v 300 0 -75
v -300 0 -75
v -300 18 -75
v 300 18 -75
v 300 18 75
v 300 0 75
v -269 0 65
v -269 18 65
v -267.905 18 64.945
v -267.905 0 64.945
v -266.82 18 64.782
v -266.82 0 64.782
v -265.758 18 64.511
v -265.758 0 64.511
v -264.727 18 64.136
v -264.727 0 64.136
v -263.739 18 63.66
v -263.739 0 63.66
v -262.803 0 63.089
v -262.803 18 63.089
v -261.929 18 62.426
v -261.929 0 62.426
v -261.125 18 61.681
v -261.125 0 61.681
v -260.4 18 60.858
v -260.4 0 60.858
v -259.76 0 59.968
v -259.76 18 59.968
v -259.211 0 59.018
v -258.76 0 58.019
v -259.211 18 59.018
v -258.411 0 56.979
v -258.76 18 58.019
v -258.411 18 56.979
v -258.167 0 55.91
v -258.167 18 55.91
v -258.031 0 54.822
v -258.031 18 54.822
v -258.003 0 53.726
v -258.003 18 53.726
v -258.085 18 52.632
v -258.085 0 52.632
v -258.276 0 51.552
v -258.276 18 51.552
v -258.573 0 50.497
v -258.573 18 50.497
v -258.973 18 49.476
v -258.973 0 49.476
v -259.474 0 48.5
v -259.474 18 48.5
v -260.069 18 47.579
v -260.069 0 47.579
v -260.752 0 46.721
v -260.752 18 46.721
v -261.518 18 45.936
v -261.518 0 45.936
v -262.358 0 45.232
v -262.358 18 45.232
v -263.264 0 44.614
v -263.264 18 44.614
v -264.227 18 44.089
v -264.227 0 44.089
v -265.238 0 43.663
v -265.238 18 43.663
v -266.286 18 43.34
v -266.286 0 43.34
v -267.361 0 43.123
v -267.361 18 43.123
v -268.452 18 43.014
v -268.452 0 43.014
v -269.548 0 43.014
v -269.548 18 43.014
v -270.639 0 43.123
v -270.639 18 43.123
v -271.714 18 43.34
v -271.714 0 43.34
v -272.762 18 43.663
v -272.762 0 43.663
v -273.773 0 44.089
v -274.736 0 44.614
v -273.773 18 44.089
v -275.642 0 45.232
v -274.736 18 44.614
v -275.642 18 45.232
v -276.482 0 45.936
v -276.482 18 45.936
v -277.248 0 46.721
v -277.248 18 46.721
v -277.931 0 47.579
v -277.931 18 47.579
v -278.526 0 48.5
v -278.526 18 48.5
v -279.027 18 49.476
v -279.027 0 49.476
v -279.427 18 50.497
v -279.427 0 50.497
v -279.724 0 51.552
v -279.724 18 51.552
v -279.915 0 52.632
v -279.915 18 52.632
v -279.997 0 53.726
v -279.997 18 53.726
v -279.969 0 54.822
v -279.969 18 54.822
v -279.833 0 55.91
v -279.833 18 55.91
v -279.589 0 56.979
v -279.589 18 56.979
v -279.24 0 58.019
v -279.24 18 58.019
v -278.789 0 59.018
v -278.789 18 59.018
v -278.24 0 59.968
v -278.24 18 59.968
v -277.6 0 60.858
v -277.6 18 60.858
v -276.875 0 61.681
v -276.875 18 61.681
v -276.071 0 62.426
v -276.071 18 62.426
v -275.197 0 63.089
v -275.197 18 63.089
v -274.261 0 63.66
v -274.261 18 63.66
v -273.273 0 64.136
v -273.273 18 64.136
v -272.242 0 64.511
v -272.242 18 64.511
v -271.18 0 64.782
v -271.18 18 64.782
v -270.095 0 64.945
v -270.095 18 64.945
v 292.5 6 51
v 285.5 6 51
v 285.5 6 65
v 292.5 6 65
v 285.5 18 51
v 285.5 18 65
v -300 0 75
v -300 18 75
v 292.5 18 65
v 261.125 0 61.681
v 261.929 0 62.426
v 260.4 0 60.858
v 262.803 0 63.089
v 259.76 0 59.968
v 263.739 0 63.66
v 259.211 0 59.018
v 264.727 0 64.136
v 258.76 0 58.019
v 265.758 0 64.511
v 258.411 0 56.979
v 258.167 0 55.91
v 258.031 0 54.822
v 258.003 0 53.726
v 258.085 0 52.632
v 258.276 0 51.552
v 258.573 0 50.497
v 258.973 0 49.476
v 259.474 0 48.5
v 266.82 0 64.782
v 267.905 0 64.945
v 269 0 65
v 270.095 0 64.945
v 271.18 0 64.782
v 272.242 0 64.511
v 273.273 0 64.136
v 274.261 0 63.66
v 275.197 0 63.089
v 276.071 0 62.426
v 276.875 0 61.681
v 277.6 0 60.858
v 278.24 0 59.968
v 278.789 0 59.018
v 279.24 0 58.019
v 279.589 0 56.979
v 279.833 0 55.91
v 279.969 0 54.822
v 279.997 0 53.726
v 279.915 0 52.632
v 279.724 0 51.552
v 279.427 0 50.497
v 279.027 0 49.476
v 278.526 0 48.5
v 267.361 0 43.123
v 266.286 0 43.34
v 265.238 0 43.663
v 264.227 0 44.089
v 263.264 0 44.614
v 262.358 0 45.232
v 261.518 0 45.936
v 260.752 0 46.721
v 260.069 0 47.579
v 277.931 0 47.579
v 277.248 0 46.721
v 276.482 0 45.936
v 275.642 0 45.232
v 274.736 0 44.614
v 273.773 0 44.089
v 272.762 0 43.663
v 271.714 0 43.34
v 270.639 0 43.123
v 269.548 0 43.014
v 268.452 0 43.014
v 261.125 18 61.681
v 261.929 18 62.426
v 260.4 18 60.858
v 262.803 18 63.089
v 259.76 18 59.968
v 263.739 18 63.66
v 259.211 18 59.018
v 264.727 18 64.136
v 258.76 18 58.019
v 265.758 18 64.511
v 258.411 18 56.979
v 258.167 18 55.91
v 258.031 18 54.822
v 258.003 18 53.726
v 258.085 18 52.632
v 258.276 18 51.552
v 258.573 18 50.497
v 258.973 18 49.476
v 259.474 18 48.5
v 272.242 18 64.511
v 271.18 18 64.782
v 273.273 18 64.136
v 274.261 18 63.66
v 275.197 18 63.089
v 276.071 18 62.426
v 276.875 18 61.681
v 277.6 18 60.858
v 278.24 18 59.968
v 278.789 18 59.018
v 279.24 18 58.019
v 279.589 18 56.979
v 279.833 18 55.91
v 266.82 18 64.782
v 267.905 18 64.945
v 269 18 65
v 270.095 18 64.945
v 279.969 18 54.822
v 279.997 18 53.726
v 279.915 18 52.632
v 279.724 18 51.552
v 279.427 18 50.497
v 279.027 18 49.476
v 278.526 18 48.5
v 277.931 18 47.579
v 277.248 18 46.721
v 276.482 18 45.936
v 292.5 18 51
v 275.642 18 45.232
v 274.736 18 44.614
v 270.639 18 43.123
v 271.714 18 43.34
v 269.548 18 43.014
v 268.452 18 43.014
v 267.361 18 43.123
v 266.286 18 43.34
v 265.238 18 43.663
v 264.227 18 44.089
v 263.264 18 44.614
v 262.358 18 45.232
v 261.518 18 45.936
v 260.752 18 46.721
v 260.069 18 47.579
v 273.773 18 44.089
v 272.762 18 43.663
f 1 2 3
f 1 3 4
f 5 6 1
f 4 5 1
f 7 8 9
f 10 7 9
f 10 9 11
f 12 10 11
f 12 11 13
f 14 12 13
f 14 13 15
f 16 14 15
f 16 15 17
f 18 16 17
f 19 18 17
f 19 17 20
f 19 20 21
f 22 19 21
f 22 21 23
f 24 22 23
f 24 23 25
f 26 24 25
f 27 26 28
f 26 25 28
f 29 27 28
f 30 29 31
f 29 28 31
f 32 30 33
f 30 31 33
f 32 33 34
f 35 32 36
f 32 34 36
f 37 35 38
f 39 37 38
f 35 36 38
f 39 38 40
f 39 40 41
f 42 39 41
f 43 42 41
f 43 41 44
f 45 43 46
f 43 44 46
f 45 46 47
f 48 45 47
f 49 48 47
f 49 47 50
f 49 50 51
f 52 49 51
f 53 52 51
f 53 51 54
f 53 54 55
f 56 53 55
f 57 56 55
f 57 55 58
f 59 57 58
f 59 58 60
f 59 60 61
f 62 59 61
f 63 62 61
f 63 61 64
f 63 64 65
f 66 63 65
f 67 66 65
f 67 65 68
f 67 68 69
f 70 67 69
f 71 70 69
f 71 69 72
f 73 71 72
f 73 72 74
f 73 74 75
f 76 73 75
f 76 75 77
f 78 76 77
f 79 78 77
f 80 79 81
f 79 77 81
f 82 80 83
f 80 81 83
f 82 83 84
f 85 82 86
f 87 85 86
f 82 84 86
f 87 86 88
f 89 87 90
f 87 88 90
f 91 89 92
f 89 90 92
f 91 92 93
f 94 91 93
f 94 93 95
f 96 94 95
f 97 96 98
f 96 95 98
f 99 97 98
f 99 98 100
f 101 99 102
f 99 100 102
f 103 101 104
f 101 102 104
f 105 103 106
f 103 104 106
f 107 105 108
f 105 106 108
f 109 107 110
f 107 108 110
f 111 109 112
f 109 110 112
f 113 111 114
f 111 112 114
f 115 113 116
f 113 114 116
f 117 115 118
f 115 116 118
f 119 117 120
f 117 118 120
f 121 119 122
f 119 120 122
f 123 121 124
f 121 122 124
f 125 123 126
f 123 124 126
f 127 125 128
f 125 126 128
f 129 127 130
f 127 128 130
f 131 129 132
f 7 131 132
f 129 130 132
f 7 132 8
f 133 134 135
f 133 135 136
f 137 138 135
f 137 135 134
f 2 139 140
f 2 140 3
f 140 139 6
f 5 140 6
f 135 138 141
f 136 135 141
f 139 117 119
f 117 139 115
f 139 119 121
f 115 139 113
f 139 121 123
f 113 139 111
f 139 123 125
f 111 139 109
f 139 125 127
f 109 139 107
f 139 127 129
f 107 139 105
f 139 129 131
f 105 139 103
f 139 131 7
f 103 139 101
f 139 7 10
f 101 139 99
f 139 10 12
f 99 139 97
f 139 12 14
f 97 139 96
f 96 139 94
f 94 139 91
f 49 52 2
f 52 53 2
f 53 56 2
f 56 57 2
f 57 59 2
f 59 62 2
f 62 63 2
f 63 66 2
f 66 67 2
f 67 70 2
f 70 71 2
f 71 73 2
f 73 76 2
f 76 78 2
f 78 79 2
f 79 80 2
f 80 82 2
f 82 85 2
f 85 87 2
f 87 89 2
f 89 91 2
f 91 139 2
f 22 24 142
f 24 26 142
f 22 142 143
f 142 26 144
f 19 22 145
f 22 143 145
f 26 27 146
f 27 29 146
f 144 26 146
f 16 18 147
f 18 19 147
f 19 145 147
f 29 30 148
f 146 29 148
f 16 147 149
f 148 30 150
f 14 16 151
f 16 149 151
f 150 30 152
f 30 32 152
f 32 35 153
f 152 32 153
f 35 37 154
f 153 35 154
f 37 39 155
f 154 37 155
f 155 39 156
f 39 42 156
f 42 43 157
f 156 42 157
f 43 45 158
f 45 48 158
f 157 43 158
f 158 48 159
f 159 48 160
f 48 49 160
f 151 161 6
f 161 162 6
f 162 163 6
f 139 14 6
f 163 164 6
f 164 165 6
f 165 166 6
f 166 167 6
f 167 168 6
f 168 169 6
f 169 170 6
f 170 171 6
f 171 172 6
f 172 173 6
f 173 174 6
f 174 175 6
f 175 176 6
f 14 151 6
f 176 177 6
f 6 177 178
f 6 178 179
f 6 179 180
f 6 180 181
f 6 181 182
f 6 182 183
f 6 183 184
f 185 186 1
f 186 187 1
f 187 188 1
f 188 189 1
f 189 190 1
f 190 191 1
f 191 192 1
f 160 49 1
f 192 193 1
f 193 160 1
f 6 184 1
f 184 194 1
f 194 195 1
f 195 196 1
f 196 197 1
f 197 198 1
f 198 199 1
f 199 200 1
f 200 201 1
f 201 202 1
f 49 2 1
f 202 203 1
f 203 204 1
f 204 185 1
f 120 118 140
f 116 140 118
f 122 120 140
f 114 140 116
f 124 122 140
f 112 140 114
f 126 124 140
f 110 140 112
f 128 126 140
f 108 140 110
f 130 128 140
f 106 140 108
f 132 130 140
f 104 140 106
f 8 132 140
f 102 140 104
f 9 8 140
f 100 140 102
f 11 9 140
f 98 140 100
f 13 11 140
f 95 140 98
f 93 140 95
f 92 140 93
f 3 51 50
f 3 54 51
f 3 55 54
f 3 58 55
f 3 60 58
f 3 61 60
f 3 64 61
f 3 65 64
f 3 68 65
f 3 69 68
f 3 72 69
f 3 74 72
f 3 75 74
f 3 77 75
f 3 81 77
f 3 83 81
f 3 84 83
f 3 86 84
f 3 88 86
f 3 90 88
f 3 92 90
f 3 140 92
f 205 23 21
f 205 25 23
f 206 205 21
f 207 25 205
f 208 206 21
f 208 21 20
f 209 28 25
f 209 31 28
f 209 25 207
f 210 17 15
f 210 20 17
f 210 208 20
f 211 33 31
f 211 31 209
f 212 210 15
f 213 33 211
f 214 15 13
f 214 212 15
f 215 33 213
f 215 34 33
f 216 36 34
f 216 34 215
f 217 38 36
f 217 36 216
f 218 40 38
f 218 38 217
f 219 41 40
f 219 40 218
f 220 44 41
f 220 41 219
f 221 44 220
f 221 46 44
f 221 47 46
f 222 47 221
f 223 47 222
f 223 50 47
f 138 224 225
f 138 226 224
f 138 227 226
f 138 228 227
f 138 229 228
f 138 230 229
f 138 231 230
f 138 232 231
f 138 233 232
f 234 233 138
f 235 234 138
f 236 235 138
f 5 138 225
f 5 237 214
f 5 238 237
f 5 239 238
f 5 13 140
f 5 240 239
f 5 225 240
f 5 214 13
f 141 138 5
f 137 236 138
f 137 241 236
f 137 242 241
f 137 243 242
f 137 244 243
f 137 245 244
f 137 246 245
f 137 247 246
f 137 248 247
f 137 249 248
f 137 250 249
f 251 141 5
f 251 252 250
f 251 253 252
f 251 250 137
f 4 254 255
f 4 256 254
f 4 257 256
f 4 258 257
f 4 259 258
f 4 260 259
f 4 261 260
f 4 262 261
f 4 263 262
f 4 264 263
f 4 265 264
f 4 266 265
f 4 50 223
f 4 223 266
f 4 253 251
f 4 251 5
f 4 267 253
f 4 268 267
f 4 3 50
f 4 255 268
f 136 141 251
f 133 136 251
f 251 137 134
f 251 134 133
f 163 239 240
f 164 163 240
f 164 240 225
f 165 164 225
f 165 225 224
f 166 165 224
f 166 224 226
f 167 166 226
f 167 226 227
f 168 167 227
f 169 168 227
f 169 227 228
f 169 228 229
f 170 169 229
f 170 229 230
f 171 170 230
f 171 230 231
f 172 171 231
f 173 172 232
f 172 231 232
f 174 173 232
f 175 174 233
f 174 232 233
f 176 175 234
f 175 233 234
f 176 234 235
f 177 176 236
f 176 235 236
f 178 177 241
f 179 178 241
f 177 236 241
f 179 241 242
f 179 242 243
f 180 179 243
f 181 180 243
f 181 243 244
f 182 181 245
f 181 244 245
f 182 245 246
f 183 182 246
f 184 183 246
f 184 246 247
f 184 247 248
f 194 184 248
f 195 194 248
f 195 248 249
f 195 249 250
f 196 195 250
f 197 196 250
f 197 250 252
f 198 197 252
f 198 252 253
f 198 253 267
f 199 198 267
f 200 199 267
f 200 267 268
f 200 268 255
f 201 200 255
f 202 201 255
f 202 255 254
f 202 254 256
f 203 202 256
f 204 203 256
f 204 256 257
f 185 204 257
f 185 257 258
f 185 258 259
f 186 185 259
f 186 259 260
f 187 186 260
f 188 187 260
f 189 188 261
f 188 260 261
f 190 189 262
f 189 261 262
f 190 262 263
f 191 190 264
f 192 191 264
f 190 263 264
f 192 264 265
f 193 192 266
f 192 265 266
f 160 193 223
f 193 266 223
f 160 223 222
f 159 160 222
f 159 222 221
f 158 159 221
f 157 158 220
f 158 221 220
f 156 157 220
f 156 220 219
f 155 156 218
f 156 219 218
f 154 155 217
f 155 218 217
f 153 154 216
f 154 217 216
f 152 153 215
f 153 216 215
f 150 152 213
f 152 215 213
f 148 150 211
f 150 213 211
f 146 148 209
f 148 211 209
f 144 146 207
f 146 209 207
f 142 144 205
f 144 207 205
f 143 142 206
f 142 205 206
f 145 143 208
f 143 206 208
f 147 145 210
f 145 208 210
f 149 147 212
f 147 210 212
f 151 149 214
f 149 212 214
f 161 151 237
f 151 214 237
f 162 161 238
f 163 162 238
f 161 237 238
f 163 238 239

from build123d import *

# Parameters (mm, degrees)
ESQUISSE1_W             = 600
ESQUISSE1_H             = 150
BOSS_EXTRU_1_DEPTH      = 18
ESQUISSE3_R             = 11
ENL_V_MAT_EXTRU_1_DEPTH = 20
ESQUISSE4_W             = 7
ESQUISSE4_H             = 14
ENL_V_MAT_EXTRU_2_DEPTH = 12


with BuildPart() as part:
    # Esquisse1 → Boss.-Extru.1 (new body)
    with BuildSketch(Plane(origin=(0, 0, 0), x_dir=(1, 0, 0), z_dir=(0, 1, 0))):
        Rectangle(ESQUISSE1_W, ESQUISSE1_H)
    extrude(amount=BOSS_EXTRU_1_DEPTH)

    # Esquisse3 → Enlèv. mat.-Extru.1 (cut)
    with BuildSketch(Plane(origin=(0, 18, 0), x_dir=(1, 0, 0), z_dir=(0, 1, 0))):
        with Locations(Location((269, -54, 0), (0, 0, 270))):
            Circle(ESQUISSE3_R)
        with Locations(Location((-269, -54, 0), (0, 0, 270))):
            Circle(ESQUISSE3_R)
    extrude(amount=-ENL_V_MAT_EXTRU_1_DEPTH, mode=Mode.SUBTRACT)

    # Esquisse4 → Enlèv. mat.-Extru.2 (cut)
    with BuildSketch(Plane(origin=(0, 18, 0), x_dir=(1, 0, 0), z_dir=(0, 1, 0))):
        with Locations((289, -58)):
            Rectangle(ESQUISSE4_W, ESQUISSE4_H)
    extrude(amount=-ENL_V_MAT_EXTRU_2_DEPTH, mode=Mode.SUBTRACT)


solid = part.part
